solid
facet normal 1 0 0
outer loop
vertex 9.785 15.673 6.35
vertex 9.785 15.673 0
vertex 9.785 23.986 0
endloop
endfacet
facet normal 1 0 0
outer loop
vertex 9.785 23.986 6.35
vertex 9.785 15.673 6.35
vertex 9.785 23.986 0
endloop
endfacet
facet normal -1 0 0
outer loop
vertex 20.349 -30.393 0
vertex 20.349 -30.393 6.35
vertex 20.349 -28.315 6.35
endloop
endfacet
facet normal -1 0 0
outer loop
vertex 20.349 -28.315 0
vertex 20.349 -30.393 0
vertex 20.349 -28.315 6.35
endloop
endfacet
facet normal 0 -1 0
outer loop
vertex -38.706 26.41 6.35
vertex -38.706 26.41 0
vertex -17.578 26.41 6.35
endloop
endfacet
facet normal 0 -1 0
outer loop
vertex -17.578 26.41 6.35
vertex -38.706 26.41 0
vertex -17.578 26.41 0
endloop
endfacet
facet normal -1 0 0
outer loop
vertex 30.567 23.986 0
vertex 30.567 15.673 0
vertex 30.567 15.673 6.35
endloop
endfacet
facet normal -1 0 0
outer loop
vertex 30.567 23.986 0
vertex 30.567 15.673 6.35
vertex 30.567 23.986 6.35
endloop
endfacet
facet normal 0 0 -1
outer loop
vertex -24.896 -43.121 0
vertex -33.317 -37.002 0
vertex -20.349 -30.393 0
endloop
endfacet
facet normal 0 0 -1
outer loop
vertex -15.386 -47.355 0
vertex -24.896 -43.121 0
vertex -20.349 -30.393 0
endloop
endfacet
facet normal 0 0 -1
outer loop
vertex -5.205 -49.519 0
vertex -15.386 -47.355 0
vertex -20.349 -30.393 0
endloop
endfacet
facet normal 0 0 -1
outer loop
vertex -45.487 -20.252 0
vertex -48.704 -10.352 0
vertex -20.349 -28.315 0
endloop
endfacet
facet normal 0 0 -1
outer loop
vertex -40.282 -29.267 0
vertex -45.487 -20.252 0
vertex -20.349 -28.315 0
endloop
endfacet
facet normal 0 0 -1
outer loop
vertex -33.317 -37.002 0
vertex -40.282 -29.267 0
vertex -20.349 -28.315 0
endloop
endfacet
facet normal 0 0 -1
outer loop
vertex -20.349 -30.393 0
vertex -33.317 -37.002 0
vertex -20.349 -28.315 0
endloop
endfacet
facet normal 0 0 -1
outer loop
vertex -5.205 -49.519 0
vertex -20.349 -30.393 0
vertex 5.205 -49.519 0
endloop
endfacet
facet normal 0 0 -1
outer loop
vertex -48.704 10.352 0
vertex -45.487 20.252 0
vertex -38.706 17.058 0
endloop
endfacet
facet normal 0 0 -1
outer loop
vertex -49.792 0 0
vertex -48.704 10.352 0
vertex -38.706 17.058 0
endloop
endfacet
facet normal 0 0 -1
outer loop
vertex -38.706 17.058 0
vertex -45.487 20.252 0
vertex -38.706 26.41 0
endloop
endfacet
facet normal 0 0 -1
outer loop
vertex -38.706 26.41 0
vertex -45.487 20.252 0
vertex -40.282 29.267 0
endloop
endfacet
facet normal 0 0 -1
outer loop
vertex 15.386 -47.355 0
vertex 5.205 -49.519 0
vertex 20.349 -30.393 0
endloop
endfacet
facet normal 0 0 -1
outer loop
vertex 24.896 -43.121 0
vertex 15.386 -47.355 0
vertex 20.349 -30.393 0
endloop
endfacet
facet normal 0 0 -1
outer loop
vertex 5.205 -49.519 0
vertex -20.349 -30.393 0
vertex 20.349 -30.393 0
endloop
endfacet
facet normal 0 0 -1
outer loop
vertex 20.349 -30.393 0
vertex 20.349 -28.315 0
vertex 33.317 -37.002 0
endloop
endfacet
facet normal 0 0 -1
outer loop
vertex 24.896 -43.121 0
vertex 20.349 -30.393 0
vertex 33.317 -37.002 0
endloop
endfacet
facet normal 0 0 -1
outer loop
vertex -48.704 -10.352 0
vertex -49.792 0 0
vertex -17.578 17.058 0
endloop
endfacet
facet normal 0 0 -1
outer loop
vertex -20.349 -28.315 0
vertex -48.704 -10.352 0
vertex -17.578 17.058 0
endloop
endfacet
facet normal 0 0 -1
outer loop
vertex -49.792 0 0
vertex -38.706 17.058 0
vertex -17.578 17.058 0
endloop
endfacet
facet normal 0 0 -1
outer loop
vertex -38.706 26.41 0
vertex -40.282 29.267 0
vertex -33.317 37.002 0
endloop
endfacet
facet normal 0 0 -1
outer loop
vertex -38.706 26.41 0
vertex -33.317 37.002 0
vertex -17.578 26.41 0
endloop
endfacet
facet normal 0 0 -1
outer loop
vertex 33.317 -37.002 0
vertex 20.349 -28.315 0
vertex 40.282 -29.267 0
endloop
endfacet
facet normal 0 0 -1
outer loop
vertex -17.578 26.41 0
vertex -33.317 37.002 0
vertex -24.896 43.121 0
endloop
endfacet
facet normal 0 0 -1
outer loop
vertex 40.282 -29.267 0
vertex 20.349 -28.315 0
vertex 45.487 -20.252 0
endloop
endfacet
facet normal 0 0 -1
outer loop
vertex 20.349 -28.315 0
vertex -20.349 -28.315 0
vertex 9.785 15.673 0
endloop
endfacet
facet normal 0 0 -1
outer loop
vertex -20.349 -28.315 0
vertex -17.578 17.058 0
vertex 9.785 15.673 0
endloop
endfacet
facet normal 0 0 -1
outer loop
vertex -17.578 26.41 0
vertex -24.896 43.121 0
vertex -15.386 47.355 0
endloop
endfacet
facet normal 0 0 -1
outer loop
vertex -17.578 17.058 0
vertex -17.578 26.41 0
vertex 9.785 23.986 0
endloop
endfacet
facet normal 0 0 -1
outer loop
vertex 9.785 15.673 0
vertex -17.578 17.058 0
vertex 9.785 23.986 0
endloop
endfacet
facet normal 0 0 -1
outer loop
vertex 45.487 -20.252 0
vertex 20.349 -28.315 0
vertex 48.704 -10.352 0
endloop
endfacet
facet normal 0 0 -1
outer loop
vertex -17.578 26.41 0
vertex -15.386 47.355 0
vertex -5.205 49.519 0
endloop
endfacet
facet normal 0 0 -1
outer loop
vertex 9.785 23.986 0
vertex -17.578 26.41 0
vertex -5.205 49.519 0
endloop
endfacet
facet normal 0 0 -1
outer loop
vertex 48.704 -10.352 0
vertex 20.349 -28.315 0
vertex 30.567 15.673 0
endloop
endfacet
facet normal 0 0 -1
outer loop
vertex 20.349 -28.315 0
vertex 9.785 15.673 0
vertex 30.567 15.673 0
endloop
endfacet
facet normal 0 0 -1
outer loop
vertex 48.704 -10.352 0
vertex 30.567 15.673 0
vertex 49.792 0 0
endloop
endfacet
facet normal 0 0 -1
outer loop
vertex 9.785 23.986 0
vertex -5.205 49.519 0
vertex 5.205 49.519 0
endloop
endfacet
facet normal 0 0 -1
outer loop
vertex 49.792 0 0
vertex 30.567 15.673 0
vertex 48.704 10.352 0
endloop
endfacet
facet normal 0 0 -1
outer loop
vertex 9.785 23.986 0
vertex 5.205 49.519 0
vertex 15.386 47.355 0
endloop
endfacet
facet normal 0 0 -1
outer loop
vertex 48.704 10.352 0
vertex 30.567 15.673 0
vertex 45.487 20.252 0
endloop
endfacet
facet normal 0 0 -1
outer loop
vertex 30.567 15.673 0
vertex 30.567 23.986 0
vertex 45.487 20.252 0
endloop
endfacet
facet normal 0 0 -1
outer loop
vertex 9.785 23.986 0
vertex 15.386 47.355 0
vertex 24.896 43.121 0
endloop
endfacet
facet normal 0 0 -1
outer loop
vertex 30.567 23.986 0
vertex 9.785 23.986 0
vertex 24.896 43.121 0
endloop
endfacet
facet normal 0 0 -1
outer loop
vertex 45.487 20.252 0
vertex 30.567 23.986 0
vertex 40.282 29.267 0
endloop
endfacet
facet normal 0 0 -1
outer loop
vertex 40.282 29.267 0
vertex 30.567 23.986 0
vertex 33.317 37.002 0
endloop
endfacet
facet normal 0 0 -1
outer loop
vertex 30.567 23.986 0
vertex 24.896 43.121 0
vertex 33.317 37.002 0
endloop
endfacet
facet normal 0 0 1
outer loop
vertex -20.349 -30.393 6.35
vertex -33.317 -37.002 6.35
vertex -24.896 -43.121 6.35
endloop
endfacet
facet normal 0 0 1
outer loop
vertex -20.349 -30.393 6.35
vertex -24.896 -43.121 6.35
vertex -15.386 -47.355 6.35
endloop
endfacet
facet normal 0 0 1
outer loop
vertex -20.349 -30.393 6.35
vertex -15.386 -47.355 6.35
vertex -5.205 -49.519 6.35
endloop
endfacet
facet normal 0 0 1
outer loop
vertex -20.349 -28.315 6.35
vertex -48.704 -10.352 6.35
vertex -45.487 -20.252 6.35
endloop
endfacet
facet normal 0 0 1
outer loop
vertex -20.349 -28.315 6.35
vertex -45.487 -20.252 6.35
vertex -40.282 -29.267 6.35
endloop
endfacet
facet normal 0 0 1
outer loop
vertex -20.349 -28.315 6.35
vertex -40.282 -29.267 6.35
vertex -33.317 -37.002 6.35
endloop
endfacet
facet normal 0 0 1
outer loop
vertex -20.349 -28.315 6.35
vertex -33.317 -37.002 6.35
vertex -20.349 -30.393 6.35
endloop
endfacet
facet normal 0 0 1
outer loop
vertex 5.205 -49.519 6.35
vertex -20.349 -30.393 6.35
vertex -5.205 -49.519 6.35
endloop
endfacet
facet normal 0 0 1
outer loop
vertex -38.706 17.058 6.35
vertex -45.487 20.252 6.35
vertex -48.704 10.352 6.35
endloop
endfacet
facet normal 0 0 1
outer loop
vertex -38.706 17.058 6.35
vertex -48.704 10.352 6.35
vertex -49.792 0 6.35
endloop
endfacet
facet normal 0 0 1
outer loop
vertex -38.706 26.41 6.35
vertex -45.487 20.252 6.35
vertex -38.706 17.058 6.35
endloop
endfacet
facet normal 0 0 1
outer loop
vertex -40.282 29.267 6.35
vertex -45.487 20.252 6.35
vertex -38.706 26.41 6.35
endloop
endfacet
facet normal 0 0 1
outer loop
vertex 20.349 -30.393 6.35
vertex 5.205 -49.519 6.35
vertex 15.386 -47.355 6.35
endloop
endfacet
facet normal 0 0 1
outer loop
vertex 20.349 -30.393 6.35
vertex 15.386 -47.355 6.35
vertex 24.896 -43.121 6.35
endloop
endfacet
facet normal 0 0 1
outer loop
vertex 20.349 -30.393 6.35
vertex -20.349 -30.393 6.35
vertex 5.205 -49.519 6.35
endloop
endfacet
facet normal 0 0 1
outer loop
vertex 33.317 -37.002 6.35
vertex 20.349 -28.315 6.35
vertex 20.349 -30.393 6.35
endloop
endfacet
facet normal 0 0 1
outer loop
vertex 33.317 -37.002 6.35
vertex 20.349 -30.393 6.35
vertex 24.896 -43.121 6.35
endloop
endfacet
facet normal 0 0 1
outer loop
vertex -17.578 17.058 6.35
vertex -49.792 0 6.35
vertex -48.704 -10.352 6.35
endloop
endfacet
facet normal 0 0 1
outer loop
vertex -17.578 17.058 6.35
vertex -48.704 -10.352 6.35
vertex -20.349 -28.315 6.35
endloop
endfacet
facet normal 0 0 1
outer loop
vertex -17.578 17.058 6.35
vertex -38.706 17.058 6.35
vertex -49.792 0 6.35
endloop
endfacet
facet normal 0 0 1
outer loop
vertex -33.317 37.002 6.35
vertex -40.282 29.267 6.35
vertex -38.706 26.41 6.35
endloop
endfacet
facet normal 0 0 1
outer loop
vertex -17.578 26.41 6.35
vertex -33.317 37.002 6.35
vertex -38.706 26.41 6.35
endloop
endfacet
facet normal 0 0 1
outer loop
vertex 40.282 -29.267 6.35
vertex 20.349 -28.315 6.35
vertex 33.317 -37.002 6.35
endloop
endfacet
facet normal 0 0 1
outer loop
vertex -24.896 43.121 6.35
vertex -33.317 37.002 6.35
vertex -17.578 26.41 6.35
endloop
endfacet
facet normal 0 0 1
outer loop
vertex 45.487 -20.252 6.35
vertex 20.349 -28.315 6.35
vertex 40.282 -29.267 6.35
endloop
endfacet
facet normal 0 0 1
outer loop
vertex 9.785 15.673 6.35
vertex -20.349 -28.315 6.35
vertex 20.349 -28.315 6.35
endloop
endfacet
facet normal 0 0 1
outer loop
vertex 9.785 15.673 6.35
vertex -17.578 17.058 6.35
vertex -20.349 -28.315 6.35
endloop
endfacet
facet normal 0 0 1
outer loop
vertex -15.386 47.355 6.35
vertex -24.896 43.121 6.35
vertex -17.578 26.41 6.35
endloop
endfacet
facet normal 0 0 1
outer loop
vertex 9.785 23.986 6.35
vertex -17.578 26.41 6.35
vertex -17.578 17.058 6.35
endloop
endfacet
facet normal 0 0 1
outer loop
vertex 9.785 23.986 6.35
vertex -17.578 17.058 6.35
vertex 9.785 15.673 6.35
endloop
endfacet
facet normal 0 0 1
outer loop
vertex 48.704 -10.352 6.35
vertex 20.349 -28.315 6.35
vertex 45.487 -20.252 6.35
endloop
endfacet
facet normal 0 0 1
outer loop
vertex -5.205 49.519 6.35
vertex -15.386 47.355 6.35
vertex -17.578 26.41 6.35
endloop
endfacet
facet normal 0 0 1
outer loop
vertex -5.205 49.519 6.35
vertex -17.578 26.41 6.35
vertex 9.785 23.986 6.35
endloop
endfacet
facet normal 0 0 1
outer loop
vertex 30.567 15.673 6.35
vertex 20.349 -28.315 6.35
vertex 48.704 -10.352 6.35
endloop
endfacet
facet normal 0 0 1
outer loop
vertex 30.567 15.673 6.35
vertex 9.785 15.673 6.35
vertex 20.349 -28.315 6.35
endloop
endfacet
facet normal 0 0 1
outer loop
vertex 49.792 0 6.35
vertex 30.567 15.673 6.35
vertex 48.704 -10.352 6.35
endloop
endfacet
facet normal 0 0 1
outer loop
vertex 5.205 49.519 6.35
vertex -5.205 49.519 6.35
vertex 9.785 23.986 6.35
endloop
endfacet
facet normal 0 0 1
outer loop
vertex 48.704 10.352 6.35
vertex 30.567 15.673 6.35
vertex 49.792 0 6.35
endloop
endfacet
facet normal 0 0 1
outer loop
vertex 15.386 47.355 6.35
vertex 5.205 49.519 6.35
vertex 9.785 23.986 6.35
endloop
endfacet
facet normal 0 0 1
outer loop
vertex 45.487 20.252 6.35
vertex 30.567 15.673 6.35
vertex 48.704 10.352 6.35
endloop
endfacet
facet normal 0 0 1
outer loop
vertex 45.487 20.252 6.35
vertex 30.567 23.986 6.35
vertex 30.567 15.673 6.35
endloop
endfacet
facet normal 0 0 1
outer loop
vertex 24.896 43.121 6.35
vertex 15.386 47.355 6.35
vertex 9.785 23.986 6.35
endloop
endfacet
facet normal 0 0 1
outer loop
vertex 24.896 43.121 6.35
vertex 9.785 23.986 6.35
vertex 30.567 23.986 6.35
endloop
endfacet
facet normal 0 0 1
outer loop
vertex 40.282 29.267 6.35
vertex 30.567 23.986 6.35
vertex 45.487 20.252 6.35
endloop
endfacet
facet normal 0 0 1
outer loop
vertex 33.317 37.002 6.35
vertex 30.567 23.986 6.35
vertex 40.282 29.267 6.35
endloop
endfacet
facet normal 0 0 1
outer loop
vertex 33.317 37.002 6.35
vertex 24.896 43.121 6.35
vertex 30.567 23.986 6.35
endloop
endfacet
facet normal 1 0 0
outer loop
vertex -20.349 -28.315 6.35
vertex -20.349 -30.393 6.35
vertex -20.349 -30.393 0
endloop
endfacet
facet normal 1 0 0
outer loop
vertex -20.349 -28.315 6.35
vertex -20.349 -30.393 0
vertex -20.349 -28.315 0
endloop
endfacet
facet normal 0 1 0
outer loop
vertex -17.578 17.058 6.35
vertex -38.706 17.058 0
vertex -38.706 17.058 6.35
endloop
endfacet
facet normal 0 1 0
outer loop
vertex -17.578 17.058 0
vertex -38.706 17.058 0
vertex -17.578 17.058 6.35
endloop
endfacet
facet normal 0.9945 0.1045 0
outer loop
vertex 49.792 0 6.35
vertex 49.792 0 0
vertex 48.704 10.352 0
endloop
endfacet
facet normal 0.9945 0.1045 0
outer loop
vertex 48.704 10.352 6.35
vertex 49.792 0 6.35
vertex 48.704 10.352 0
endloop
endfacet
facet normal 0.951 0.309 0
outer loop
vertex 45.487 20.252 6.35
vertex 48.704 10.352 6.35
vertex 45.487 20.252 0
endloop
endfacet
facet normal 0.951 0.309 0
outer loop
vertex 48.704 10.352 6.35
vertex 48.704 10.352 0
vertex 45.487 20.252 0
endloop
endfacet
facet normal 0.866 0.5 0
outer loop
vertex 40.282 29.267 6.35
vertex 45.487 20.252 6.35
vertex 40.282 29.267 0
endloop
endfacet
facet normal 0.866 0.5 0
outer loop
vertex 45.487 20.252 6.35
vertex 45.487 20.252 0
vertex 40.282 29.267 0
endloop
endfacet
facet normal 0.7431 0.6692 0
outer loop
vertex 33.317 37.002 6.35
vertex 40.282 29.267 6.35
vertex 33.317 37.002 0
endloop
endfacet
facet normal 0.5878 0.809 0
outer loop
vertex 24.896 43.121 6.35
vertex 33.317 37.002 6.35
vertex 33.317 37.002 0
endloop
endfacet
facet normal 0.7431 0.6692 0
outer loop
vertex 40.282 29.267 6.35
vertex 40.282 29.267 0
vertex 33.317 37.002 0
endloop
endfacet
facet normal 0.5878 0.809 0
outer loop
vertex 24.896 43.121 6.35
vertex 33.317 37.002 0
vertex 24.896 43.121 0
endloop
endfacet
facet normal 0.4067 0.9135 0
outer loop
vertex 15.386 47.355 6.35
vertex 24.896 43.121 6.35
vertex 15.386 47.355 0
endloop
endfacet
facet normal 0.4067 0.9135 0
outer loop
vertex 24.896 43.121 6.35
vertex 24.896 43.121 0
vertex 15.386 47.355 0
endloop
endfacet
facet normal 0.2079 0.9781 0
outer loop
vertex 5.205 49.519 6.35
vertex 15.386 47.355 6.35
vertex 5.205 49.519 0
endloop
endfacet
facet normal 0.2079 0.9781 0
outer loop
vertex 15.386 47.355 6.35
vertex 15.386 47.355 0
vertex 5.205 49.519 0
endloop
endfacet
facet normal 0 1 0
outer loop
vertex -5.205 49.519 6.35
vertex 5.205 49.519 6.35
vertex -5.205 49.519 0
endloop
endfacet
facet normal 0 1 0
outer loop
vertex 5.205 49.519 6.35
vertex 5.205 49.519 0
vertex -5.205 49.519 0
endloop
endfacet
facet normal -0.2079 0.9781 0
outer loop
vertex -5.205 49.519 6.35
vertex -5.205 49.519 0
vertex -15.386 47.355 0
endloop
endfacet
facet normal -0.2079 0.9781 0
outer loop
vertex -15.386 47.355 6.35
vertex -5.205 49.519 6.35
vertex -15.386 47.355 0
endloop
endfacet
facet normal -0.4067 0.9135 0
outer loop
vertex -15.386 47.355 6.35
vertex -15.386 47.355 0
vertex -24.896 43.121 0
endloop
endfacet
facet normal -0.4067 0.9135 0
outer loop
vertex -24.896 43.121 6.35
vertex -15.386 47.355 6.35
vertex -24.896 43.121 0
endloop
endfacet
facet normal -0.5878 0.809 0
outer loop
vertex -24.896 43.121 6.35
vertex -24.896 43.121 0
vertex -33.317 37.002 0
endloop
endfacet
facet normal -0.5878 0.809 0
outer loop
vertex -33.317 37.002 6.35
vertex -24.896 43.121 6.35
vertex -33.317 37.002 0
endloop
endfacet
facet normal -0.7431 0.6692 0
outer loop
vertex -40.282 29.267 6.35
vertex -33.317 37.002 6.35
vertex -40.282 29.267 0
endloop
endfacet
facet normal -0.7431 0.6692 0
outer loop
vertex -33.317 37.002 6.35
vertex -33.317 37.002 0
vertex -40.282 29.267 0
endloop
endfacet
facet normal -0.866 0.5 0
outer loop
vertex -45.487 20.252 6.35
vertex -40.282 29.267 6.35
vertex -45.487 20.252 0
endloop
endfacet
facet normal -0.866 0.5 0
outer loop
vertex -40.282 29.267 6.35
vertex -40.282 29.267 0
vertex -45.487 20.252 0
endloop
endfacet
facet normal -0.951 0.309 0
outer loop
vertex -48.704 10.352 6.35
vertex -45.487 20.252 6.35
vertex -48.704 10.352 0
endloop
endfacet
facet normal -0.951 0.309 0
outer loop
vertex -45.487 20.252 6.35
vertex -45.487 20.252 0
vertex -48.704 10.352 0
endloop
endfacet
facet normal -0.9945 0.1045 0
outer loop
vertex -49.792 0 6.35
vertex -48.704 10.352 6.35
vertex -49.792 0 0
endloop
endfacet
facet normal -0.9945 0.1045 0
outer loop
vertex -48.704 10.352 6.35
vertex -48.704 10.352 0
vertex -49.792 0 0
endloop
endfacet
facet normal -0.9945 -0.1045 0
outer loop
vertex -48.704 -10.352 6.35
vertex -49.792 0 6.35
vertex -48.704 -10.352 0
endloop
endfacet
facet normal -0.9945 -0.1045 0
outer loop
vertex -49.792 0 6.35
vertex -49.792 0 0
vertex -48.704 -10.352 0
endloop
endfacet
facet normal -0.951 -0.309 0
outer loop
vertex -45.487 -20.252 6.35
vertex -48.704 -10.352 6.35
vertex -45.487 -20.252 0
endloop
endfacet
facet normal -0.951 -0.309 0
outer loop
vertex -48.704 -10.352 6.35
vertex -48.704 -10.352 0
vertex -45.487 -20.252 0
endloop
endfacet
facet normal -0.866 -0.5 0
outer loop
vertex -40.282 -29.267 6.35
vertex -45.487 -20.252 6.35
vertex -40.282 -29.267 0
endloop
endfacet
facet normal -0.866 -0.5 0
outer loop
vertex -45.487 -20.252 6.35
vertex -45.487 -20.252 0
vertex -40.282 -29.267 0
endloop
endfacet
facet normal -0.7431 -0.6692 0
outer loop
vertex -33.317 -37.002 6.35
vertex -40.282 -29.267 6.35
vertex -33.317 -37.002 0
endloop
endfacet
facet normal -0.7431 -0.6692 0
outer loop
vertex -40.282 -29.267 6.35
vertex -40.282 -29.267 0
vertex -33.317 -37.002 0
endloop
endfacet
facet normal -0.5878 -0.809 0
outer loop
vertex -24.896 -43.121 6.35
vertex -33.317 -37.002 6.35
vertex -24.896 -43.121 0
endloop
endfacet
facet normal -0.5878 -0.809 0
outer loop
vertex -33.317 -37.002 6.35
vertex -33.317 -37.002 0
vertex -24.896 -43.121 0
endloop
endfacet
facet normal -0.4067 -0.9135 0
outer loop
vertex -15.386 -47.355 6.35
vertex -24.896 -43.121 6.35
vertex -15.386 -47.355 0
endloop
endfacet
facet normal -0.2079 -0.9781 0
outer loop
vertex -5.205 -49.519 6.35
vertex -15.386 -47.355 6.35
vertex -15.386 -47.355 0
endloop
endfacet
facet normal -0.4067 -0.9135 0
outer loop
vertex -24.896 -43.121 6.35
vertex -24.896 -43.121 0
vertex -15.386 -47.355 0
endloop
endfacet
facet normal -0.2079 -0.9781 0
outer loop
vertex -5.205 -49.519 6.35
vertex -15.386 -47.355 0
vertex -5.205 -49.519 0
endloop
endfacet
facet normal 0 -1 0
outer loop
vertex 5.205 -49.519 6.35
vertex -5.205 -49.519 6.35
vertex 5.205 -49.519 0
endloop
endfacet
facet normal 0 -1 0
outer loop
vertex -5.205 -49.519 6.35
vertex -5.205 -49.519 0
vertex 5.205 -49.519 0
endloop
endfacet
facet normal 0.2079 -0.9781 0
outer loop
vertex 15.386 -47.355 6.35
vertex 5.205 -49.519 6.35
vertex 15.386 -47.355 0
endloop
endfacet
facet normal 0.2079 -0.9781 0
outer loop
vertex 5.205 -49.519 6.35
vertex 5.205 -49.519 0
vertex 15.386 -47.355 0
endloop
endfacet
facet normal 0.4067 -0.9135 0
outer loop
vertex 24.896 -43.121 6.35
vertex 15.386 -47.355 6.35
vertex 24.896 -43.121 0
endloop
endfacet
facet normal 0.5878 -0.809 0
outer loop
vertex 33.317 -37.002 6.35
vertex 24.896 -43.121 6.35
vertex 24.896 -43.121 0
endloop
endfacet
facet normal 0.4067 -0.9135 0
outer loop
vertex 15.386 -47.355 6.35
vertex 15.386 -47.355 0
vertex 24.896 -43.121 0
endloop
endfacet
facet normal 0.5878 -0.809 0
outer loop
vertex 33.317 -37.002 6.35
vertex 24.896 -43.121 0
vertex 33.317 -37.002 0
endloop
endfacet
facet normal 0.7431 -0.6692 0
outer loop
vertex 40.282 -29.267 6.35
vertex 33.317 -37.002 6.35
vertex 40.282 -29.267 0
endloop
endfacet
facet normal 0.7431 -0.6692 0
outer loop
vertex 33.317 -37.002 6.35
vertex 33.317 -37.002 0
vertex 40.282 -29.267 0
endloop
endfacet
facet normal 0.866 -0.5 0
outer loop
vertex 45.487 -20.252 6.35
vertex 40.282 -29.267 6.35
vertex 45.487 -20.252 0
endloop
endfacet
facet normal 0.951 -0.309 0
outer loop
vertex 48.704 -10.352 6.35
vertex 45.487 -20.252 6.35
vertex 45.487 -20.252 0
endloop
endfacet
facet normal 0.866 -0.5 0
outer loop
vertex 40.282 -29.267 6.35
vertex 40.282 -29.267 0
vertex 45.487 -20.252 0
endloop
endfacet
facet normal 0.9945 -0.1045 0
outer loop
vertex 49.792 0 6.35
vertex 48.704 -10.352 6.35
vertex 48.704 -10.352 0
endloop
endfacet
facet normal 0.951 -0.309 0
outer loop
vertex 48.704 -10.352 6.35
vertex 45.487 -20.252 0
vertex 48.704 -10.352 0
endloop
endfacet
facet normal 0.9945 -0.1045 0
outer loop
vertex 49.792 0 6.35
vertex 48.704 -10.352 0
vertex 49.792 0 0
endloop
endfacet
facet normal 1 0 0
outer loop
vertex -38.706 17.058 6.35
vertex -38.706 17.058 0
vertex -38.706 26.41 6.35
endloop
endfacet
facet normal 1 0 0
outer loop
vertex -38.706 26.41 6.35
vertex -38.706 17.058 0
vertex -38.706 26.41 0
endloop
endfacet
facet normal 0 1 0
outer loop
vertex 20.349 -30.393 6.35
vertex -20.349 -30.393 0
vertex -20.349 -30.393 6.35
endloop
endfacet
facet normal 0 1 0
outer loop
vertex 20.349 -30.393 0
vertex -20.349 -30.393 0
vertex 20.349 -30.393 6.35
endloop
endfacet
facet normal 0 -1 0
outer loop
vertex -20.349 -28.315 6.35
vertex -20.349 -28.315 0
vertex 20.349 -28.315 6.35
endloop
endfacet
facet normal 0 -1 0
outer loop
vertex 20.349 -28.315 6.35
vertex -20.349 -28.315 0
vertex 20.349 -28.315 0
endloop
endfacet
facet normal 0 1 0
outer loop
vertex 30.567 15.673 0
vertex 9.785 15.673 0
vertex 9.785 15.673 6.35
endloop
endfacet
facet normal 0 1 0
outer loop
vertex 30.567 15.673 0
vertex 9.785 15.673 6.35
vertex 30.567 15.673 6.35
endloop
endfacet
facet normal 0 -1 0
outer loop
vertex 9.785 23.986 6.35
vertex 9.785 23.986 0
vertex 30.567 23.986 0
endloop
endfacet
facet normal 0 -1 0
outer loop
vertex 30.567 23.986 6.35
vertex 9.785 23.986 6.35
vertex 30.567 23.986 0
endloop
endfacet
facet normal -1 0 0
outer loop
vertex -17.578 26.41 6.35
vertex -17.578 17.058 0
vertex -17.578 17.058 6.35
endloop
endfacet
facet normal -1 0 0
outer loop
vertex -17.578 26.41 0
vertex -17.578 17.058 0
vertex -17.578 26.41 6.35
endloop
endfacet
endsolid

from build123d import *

# Parameters (mm, degrees)
F0_R     = 49.7916549323
F2_DEPTH = 6.35
F1_W     = 21.1281813681
F1_H     = 9.3518197536
F3_DEPTH = 6.351
F4_W     = 20.7818225026
F4_H     = 8.3127245307
F5_DEPTH = 6.351
F6_W     = 43.4686355293
F6_H     = 2.7709081769
F7_DEPTH = 145
F8_W     = 40.6977310777
F8_H     = 2.0781829953
F9_DEPTH = 6.351


# Not quite as in the source:
# - an extrude ends at something that could not be found from the text; its depth is read off the source's solid


with BuildPart() as f2:
    # F0 (on Top) → F2 (new body)
    with BuildSketch(Plane.XY):
        Circle(F0_R)
    extrude(amount=F2_DEPTH)

    # F1 (on face) → F3 (cut, through all)
    with BuildSketch(Plane.XY):
        with Locations((-28.1420461833, 21.7343177646)):
            Rectangle(F1_W, F1_H)
    extrude(amount=F3_DEPTH, mode=Mode.SUBTRACT)

    # F4 (on Top) → F5 (cut, through all)
    with BuildSketch(Plane.XY):
        with Locations((20.1756805182, 19.8293179274)):
            Rectangle(F4_W, F4_H)
    extrude(amount=F5_DEPTH, mode=Mode.SUBTRACT)

    # F6 (on face) → F7 (cut, through all)
    with BuildSketch(Plane.XY.offset(6.35)):
        with Locations((0, -21.9075009227)):
            Rectangle(F6_W, F6_H)
    extrude(amount=F7_DEPTH, mode=Mode.SUBTRACT)

    # F8 (on Top) → F9 (cut, through all)
    with BuildSketch(Plane.XY):
        with Locations((0, -29.3543189764)):
            Rectangle(F8_W, F8_H)
    extrude(amount=F9_DEPTH, mode=Mode.SUBTRACT)


solid = f2.part
